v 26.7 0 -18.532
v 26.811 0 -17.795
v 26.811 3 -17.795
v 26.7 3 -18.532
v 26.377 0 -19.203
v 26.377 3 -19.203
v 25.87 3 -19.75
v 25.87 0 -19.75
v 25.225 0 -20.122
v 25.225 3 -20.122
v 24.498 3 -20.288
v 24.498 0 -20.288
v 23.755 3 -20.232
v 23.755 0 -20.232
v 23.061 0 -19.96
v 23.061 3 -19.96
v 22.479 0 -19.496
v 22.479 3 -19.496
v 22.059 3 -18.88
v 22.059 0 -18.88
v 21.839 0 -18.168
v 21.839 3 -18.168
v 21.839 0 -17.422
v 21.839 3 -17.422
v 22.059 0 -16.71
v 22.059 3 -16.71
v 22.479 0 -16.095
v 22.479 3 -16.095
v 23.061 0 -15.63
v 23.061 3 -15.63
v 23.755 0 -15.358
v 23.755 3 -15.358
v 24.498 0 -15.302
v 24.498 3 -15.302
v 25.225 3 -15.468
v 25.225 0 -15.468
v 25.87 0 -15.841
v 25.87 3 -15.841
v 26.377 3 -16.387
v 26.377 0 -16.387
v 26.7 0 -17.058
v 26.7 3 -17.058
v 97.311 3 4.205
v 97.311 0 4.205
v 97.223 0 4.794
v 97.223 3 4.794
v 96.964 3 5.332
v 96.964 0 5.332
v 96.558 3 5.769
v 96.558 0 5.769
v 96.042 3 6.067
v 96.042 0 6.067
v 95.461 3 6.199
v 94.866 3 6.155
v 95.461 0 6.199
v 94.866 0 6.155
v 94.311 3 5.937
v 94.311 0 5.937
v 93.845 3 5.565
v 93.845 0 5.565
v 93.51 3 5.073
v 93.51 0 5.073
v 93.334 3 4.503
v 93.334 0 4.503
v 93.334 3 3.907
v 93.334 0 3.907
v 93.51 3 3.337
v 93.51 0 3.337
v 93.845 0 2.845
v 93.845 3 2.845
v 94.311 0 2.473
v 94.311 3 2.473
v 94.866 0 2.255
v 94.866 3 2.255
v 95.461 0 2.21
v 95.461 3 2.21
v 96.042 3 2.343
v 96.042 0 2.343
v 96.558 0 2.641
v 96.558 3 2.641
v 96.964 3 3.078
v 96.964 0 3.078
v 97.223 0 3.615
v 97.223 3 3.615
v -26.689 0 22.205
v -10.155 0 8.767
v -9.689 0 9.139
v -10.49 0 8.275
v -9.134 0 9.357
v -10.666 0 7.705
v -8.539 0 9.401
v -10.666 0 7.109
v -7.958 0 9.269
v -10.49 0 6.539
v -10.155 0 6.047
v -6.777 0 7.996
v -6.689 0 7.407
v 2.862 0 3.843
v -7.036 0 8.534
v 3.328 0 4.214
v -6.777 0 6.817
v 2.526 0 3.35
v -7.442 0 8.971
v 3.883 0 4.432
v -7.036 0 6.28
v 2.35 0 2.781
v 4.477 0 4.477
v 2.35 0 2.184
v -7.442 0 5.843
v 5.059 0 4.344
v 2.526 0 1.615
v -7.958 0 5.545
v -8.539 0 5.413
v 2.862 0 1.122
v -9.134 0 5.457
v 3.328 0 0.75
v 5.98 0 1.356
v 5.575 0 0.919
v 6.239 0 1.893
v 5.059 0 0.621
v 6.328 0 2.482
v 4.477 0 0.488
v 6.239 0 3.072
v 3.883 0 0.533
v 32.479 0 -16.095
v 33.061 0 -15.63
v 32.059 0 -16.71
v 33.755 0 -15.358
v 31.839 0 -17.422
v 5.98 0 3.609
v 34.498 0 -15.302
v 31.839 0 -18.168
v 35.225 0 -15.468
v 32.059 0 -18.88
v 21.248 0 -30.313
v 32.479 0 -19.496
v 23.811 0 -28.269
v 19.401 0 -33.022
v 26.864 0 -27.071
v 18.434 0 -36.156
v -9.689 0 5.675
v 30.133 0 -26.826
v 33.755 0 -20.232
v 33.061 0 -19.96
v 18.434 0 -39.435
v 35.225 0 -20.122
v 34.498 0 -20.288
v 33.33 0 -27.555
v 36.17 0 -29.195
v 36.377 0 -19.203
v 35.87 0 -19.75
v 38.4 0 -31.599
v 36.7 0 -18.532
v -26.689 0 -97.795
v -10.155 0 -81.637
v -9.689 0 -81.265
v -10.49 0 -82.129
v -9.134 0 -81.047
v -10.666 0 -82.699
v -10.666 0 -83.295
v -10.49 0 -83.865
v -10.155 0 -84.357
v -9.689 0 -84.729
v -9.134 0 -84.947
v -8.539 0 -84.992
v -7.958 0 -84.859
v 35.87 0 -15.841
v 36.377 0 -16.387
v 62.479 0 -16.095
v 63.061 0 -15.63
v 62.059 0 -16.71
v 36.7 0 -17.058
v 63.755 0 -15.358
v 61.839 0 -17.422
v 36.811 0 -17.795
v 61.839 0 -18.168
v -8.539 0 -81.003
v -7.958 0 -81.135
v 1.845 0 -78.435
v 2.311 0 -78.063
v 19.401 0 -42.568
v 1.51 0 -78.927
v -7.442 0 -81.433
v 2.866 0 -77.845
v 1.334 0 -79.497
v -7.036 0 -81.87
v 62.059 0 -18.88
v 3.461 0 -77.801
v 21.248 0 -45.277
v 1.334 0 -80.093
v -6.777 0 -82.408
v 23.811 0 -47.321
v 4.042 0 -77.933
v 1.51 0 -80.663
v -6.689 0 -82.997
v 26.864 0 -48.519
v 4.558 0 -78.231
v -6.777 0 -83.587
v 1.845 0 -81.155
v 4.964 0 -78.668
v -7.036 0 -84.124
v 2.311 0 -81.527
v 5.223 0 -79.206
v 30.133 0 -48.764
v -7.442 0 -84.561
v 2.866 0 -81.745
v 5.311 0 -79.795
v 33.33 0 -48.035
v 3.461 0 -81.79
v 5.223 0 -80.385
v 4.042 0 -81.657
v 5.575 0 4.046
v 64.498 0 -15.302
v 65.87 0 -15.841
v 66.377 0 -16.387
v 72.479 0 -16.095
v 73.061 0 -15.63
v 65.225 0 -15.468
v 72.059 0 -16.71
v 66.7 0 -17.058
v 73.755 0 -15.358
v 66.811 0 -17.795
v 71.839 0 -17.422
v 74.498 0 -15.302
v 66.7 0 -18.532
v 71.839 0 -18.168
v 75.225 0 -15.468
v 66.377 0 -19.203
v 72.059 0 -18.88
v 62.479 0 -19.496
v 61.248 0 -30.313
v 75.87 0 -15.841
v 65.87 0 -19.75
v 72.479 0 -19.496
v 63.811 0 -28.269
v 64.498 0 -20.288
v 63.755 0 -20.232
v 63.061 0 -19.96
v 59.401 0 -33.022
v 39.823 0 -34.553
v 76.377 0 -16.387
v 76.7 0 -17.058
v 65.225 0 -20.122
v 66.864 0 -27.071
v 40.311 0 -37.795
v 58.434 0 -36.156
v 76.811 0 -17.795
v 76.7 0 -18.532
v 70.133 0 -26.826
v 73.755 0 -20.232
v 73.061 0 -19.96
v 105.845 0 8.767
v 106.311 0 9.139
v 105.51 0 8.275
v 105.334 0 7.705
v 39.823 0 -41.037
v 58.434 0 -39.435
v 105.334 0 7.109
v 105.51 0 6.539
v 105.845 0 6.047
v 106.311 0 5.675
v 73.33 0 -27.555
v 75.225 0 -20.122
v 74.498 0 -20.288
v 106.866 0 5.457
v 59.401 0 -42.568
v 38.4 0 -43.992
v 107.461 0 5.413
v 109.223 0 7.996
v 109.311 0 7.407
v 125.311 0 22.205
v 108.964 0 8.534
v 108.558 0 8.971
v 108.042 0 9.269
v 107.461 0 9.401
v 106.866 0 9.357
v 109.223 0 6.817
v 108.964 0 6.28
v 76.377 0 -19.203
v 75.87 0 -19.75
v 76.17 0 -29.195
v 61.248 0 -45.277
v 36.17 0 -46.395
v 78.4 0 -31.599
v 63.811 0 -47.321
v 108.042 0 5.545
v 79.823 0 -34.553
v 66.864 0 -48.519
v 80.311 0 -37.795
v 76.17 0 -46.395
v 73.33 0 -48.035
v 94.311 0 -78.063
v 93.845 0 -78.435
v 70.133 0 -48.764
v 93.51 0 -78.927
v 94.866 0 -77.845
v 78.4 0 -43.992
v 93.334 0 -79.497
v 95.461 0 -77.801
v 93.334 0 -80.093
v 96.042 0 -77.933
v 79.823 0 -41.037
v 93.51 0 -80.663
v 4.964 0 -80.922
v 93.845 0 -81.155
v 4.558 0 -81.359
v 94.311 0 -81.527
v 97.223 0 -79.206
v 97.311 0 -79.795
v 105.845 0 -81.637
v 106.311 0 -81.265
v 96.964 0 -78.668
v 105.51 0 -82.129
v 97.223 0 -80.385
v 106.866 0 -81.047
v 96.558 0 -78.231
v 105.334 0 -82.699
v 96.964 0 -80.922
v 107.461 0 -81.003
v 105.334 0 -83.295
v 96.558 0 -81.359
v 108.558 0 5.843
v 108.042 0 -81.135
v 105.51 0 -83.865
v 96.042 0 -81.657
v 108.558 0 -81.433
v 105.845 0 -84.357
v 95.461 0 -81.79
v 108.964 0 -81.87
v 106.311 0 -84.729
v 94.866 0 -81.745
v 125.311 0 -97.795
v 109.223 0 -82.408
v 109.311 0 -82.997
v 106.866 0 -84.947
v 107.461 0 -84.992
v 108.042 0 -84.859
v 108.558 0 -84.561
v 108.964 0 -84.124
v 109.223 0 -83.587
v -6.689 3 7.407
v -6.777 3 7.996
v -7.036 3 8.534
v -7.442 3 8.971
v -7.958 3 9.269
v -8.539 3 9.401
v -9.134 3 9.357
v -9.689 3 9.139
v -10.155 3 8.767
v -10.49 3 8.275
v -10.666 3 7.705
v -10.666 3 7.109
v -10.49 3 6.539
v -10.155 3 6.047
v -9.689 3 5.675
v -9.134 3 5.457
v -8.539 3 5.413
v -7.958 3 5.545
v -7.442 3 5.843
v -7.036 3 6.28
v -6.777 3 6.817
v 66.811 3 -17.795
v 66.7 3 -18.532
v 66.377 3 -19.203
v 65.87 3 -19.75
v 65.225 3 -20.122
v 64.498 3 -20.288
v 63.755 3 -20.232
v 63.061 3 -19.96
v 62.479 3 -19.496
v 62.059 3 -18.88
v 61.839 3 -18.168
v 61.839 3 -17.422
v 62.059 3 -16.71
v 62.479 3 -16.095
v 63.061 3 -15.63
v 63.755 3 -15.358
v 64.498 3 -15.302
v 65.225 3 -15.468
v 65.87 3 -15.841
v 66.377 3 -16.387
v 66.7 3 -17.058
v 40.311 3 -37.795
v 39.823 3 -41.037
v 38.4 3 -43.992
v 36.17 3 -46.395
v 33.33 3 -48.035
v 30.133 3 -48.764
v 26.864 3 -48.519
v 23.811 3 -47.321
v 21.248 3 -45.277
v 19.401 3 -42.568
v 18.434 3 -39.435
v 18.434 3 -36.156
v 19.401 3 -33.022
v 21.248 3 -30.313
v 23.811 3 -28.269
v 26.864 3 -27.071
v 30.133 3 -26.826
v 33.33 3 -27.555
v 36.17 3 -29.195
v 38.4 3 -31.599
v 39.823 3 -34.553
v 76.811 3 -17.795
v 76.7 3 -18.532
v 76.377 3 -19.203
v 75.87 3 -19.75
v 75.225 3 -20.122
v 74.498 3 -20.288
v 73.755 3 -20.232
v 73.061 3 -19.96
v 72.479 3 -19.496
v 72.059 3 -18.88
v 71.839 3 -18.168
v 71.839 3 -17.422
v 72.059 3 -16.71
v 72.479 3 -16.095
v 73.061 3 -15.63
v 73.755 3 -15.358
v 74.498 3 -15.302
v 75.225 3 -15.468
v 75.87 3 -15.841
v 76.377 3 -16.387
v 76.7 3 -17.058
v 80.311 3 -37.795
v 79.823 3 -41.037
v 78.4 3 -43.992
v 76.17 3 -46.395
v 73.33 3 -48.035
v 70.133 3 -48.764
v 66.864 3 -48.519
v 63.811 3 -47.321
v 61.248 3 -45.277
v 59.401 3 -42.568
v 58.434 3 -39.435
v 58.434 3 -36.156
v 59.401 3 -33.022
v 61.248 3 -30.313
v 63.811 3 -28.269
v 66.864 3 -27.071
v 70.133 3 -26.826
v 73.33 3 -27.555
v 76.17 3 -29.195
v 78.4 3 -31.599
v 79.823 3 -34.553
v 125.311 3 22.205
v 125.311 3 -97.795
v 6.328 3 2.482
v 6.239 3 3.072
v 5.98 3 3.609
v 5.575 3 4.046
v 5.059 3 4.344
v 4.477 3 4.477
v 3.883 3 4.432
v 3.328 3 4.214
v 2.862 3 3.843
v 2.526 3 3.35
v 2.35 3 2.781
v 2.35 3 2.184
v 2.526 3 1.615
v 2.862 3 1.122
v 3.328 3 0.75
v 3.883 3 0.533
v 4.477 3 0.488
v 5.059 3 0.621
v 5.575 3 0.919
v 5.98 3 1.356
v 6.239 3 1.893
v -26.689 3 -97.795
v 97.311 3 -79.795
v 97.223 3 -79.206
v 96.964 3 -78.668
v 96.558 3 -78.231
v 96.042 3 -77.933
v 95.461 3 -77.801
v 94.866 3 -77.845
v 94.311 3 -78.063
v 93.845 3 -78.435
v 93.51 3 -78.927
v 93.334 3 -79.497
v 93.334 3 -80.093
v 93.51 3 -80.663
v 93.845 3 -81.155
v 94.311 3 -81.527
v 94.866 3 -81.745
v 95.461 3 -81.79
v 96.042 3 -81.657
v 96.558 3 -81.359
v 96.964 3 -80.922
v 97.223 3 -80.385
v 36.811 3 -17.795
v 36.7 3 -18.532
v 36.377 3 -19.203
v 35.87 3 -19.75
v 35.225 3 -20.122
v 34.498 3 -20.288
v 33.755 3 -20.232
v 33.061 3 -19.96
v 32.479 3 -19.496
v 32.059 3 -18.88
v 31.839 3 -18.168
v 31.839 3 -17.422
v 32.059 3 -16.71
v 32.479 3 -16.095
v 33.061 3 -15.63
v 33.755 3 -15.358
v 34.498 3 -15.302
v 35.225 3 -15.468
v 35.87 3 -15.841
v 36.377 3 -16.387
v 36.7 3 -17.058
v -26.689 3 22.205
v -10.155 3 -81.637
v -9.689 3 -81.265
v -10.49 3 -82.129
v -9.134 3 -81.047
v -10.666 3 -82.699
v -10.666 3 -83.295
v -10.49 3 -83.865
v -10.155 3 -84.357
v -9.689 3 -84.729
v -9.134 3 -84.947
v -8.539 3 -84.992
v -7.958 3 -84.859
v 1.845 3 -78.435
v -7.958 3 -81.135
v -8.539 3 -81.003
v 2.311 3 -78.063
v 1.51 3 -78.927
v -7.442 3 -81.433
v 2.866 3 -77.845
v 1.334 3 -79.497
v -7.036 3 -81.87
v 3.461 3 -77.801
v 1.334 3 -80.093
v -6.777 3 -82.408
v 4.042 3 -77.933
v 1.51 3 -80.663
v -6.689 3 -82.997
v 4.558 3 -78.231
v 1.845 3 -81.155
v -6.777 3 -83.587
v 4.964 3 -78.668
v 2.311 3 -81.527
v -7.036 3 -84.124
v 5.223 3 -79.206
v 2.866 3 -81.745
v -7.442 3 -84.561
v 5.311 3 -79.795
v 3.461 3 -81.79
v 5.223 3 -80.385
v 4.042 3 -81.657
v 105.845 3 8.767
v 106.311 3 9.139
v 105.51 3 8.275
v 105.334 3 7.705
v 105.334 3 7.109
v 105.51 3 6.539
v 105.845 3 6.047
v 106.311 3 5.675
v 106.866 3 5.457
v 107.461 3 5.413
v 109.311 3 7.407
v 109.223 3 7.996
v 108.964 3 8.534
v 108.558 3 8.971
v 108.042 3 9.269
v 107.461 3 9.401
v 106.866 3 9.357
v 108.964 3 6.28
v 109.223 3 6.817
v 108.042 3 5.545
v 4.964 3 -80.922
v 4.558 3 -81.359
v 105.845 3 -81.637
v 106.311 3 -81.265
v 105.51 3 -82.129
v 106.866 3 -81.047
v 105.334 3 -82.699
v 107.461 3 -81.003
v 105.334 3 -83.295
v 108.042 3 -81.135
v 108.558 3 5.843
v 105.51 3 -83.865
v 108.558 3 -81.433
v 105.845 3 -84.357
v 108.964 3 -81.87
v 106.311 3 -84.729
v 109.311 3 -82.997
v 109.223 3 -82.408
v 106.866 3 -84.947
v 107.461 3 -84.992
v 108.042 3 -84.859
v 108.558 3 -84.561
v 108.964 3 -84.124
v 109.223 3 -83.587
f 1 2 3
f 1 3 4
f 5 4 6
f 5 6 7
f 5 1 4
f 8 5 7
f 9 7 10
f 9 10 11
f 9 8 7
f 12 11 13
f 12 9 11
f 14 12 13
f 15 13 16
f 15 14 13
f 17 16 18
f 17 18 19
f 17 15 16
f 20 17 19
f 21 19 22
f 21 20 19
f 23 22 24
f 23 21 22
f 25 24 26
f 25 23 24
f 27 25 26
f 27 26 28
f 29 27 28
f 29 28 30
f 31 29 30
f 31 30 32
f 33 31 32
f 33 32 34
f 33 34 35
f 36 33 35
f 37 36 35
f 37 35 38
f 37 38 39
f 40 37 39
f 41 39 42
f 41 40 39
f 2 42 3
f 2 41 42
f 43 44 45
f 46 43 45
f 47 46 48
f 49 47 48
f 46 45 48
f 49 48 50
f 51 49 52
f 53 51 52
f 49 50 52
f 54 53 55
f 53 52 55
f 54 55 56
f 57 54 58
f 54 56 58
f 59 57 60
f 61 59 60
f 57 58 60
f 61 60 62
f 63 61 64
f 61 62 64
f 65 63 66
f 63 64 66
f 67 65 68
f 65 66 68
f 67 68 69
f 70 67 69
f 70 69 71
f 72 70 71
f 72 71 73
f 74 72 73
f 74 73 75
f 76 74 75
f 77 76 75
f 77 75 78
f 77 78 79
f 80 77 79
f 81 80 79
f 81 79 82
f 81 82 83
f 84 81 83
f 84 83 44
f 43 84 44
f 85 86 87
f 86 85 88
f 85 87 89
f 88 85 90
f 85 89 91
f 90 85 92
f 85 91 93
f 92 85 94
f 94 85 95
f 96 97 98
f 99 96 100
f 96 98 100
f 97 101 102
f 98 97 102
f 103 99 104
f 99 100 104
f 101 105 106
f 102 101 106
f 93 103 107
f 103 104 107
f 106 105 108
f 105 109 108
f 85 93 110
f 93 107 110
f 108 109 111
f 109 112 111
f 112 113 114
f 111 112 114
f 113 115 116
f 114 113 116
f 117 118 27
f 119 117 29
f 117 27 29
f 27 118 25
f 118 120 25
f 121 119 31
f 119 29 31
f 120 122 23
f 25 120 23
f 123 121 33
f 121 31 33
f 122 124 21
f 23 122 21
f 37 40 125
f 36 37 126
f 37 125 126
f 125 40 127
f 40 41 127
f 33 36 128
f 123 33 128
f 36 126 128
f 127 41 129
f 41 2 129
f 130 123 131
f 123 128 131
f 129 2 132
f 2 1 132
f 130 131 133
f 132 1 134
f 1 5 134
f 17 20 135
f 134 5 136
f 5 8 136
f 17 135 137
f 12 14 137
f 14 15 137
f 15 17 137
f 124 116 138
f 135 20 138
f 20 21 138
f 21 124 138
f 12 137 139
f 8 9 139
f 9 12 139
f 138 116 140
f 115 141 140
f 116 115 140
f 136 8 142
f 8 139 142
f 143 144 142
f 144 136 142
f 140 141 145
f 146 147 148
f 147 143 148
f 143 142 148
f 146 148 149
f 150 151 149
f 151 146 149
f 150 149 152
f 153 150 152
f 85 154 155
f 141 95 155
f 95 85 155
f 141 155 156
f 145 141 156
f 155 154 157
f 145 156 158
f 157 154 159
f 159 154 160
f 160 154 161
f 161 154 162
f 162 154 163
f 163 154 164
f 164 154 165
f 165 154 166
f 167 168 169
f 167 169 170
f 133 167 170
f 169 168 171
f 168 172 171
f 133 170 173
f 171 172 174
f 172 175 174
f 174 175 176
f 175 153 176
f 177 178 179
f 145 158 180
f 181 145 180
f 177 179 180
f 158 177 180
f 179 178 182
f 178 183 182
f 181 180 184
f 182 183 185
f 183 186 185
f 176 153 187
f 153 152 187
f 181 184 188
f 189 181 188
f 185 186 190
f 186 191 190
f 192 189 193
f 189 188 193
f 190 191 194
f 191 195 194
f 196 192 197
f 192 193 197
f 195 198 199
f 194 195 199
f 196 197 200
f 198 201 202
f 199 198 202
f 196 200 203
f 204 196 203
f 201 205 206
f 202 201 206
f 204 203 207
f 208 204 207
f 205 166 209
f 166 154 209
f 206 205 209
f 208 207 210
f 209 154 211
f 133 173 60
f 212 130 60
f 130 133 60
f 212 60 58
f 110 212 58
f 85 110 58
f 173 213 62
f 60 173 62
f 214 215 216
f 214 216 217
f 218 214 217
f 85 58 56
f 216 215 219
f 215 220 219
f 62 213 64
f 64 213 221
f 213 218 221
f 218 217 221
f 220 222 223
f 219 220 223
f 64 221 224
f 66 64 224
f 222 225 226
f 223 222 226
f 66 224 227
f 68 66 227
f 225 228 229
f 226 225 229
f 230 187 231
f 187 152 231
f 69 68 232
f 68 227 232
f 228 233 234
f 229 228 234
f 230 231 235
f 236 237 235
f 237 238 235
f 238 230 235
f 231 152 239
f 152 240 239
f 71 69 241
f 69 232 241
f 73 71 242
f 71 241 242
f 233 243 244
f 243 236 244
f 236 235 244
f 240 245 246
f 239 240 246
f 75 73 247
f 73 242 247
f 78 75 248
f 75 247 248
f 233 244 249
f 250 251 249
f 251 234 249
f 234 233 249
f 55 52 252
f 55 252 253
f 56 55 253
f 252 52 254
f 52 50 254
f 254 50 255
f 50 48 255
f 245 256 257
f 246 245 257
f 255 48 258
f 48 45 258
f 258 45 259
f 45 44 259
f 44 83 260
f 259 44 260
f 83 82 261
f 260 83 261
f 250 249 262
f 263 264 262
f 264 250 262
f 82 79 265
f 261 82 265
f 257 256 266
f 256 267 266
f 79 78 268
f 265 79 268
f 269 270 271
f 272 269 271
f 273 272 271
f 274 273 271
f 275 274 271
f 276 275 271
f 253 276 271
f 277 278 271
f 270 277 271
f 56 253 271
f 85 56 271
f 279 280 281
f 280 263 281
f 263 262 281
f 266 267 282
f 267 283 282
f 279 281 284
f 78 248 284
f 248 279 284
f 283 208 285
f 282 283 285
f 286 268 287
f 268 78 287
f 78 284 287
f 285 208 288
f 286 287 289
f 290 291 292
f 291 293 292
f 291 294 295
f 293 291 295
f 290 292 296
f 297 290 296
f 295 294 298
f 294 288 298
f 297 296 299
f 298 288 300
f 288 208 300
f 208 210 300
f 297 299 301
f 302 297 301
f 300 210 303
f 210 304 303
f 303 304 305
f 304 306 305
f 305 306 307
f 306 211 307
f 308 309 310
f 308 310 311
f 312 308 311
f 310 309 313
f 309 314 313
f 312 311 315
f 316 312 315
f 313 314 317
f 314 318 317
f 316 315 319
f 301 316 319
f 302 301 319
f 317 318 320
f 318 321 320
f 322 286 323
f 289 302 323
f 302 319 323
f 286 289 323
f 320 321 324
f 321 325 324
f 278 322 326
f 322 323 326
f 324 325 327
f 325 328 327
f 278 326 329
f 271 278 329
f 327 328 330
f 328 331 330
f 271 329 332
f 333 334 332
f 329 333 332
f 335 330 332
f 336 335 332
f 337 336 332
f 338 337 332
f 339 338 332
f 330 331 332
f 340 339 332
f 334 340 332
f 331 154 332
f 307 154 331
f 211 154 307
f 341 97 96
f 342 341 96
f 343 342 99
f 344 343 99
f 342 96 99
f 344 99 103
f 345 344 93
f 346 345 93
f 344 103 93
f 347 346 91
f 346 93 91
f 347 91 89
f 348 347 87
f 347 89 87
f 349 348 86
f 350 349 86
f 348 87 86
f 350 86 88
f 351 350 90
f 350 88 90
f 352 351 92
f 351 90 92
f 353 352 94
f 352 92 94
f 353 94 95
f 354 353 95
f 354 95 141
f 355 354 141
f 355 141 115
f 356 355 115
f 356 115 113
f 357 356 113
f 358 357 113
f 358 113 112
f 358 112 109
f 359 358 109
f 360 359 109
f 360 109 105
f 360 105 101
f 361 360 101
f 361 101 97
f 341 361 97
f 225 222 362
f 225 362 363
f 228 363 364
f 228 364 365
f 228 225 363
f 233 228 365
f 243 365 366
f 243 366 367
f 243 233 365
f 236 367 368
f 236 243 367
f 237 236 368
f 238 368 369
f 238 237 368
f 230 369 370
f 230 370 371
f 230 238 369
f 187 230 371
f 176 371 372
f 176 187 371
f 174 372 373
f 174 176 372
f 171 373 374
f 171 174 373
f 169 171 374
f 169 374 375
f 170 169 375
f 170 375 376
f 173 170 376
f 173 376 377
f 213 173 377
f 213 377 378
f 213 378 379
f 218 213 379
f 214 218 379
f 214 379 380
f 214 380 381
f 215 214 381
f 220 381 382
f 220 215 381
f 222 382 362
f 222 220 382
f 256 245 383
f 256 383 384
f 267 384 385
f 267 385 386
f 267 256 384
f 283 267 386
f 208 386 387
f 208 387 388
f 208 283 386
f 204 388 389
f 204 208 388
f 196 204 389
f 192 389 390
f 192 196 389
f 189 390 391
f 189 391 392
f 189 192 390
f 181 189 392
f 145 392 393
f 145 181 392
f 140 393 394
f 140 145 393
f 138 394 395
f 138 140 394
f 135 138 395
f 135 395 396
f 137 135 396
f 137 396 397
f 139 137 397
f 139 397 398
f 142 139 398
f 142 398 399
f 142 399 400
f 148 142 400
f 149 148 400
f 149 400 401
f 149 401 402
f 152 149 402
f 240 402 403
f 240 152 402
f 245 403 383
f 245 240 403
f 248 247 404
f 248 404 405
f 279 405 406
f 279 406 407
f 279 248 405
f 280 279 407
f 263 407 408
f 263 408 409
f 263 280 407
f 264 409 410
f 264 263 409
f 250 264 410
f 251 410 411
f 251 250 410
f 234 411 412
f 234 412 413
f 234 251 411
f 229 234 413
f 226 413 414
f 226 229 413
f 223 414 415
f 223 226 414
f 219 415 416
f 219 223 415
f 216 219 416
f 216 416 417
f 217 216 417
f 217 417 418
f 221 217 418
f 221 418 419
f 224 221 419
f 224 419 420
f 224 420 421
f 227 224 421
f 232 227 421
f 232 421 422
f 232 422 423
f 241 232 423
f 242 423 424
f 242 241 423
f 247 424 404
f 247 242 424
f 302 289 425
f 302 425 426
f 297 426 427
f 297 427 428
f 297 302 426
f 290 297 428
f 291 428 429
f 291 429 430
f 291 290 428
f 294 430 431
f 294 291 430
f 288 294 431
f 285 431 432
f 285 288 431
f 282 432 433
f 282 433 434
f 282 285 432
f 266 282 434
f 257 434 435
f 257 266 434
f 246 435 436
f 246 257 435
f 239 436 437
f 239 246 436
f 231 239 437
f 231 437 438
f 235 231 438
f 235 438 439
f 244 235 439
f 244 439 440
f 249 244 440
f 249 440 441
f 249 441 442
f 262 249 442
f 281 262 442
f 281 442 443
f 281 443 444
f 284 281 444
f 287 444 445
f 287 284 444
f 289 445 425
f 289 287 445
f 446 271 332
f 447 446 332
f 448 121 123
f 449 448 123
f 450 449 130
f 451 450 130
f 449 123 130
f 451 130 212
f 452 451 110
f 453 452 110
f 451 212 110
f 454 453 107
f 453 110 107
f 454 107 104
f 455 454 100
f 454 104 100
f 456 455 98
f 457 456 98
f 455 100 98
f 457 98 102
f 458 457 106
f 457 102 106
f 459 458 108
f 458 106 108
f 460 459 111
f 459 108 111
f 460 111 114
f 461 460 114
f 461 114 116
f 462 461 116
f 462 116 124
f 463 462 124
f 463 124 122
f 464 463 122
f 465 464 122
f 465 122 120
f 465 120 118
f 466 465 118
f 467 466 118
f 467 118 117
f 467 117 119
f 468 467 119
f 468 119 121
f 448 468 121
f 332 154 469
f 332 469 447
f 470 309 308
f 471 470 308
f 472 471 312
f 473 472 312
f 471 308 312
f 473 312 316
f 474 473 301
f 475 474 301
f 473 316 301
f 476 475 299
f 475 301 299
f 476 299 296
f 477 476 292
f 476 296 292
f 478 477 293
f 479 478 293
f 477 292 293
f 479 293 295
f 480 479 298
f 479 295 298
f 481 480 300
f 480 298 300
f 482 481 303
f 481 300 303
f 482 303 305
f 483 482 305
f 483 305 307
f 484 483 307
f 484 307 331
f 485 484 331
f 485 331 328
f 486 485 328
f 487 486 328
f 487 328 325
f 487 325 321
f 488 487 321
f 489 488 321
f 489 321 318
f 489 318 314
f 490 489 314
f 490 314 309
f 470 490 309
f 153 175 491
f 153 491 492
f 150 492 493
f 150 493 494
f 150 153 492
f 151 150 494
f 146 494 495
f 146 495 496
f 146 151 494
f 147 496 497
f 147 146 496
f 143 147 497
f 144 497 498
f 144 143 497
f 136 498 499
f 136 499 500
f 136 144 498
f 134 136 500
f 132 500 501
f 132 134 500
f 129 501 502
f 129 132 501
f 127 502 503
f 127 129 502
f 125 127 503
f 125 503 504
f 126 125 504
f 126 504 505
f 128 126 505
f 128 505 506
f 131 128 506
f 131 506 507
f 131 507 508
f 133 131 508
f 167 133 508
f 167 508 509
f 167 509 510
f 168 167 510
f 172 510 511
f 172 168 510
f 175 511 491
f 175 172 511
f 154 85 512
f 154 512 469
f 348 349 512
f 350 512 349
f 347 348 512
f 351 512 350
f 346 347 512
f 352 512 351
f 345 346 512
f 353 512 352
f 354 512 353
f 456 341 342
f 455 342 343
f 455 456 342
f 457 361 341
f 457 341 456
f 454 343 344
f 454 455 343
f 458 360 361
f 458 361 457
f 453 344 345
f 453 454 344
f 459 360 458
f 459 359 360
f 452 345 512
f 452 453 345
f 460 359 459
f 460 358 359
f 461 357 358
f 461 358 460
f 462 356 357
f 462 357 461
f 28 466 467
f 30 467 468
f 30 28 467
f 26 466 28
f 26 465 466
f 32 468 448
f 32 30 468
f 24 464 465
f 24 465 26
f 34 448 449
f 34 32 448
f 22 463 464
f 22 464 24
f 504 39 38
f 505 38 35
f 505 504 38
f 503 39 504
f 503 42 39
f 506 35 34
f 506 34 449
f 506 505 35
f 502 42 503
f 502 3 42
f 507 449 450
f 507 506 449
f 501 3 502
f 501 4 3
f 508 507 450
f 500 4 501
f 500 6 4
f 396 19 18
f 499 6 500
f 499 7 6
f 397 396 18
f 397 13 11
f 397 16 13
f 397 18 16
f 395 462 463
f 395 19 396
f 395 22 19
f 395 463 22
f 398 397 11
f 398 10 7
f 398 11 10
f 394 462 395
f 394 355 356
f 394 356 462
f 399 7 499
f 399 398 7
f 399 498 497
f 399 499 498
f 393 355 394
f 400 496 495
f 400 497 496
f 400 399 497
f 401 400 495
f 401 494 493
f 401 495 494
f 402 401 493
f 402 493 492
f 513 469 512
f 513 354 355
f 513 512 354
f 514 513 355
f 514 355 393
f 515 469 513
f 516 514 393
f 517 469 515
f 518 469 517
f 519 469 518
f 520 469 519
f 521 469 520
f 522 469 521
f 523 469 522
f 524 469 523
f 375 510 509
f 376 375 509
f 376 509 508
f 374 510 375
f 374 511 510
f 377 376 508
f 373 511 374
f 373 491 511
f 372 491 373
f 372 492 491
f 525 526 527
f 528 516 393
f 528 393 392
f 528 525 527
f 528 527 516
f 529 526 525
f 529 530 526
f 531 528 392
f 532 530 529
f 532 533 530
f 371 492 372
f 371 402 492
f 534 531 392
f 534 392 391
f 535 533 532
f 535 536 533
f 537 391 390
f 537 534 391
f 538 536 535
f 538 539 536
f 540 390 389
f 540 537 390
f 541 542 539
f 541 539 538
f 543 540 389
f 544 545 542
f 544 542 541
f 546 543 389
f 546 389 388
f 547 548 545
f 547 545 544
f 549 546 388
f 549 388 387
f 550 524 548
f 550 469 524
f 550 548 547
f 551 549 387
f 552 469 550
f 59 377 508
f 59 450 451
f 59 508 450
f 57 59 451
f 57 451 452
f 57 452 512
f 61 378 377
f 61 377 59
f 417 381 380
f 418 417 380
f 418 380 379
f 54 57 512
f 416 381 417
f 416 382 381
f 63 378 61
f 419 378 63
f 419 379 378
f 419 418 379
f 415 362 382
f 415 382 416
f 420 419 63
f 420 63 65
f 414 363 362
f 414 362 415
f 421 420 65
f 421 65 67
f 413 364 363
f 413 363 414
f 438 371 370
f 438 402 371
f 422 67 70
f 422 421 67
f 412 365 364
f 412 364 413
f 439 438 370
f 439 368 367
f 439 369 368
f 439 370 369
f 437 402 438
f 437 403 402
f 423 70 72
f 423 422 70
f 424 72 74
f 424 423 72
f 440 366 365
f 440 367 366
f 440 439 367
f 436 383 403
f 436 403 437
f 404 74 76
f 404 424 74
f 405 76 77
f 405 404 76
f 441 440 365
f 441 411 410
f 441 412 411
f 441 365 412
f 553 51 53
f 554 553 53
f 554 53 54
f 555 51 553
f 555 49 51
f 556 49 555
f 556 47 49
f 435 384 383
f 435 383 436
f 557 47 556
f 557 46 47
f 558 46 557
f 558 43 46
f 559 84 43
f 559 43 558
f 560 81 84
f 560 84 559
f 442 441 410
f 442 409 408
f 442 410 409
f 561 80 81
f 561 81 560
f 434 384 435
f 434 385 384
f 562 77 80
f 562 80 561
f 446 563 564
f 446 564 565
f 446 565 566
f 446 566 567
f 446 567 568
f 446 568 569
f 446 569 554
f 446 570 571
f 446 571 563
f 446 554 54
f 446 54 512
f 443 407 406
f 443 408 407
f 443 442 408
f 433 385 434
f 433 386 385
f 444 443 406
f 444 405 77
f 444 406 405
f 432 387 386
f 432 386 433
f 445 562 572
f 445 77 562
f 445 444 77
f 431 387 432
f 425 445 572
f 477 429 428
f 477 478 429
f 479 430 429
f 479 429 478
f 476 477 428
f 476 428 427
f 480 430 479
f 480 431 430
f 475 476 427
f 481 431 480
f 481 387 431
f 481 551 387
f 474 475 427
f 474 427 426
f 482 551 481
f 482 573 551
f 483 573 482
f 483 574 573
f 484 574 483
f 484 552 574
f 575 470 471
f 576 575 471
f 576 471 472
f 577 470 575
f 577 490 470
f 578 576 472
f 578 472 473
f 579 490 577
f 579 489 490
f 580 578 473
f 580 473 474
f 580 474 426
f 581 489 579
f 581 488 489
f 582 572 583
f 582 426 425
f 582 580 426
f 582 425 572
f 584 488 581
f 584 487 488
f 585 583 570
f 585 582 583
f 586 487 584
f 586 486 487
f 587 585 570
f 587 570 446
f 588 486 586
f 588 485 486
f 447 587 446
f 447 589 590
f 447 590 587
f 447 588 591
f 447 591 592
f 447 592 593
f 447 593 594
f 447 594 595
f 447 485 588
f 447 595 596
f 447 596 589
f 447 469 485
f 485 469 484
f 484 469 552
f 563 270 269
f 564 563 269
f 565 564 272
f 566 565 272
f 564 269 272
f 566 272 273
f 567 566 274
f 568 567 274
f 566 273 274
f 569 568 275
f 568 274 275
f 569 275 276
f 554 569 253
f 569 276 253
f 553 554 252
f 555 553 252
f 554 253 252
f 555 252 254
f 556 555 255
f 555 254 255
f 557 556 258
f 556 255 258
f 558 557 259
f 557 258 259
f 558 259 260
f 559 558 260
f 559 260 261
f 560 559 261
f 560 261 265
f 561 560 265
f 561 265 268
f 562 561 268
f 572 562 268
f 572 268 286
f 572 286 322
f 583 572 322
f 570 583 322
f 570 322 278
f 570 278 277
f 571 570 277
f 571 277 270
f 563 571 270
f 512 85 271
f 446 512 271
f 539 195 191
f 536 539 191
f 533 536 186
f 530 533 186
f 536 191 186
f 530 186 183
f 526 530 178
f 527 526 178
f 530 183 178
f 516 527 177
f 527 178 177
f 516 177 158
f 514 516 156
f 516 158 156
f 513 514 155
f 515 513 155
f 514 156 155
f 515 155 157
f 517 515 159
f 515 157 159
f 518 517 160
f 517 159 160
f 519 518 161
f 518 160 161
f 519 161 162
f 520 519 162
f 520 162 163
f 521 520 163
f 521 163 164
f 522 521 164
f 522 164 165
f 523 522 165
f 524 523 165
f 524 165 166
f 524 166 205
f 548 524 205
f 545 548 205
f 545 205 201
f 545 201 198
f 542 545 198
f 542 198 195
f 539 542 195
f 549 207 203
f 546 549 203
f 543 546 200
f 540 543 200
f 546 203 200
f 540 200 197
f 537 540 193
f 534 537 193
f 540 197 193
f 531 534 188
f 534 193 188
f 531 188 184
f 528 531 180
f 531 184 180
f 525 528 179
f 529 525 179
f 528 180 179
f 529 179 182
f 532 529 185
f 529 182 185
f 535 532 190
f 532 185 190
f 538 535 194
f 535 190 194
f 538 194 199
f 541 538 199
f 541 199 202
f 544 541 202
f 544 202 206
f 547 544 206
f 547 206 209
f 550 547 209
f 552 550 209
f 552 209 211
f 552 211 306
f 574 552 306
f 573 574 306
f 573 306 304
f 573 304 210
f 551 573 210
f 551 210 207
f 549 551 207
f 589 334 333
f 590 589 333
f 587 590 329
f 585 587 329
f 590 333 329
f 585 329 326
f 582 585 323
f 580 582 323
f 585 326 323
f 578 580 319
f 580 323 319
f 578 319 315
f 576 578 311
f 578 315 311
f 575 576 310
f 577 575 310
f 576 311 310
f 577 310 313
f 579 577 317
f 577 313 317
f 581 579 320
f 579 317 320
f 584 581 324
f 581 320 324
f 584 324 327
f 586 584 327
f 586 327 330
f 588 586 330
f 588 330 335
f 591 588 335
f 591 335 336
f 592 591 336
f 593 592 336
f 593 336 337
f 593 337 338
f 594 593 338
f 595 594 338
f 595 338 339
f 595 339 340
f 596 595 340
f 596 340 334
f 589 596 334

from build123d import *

# Parameters (mm, degrees)
SKETCH1_W           = 152
SKETCH1_H           = 120
SKETCH1_R           = 2.5
SKETCH1_R_2         = 11
BOSS_EXTRUDE1_DEPTH = 3
SKETCH2_R           = 2
CUT_EXTRUDE1_DEPTH  = 4


with BuildPart() as part:
    # Sketch1 → Boss-Extrude1 (new body)
    with BuildSketch(Plane(origin=(0, 0, 0), x_dir=(1, 0, 0), z_dir=(0, 1, 0))):
        with Locations((49.311456102, 37.795094937)):
            Rectangle(SKETCH1_W, SKETCH1_H)
        with Locations((24.311456102, 17.795094937)):
            Circle(SKETCH1_R, mode=Mode.SUBTRACT)
        with Locations((34.311456102, 17.795094937)):
            Circle(SKETCH1_R, mode=Mode.SUBTRACT)
        with Locations((64.311456102, 17.795094937)):
            Circle(SKETCH1_R, mode=Mode.SUBTRACT)
        with Locations((74.311456102, 17.795094937)):
            Circle(SKETCH1_R, mode=Mode.SUBTRACT)
        with Locations((29.311456102, 37.795094937)):
            Circle(SKETCH1_R_2, mode=Mode.SUBTRACT)
        with Locations((69.311456102, 37.795094937)):
            Circle(SKETCH1_R_2, mode=Mode.SUBTRACT)
    extrude(amount=BOSS_EXTRUDE1_DEPTH)

    # Sketch2 → Cut-Extrude1 (cut, through all)
    with BuildSketch(Plane.XZ):
        with Locations((4.327840203, 2.482417514)):
            Circle(SKETCH2_R)
        with Locations((95.311456102, -79.795094937)):
            Circle(SKETCH2_R)
        with Locations((3.311456102, -79.795094937)):
            Circle(SKETCH2_R)
        with Locations((-8.688543898, -82.997135966)):
            Circle(SKETCH2_R)
        with Locations((95.311456102, 4.204905063)):
            Circle(SKETCH2_R)
        with Locations((107.311456102, -82.997135966)):
            Circle(SKETCH2_R)
        with Locations((-8.688543898, 7.406946092)):
            Circle(SKETCH2_R)
        with Locations((107.311456102, 7.406946092)):
            Circle(SKETCH2_R)
    extrude(amount=-CUT_EXTRUDE1_DEPTH, mode=Mode.SUBTRACT)


solid = part.part
